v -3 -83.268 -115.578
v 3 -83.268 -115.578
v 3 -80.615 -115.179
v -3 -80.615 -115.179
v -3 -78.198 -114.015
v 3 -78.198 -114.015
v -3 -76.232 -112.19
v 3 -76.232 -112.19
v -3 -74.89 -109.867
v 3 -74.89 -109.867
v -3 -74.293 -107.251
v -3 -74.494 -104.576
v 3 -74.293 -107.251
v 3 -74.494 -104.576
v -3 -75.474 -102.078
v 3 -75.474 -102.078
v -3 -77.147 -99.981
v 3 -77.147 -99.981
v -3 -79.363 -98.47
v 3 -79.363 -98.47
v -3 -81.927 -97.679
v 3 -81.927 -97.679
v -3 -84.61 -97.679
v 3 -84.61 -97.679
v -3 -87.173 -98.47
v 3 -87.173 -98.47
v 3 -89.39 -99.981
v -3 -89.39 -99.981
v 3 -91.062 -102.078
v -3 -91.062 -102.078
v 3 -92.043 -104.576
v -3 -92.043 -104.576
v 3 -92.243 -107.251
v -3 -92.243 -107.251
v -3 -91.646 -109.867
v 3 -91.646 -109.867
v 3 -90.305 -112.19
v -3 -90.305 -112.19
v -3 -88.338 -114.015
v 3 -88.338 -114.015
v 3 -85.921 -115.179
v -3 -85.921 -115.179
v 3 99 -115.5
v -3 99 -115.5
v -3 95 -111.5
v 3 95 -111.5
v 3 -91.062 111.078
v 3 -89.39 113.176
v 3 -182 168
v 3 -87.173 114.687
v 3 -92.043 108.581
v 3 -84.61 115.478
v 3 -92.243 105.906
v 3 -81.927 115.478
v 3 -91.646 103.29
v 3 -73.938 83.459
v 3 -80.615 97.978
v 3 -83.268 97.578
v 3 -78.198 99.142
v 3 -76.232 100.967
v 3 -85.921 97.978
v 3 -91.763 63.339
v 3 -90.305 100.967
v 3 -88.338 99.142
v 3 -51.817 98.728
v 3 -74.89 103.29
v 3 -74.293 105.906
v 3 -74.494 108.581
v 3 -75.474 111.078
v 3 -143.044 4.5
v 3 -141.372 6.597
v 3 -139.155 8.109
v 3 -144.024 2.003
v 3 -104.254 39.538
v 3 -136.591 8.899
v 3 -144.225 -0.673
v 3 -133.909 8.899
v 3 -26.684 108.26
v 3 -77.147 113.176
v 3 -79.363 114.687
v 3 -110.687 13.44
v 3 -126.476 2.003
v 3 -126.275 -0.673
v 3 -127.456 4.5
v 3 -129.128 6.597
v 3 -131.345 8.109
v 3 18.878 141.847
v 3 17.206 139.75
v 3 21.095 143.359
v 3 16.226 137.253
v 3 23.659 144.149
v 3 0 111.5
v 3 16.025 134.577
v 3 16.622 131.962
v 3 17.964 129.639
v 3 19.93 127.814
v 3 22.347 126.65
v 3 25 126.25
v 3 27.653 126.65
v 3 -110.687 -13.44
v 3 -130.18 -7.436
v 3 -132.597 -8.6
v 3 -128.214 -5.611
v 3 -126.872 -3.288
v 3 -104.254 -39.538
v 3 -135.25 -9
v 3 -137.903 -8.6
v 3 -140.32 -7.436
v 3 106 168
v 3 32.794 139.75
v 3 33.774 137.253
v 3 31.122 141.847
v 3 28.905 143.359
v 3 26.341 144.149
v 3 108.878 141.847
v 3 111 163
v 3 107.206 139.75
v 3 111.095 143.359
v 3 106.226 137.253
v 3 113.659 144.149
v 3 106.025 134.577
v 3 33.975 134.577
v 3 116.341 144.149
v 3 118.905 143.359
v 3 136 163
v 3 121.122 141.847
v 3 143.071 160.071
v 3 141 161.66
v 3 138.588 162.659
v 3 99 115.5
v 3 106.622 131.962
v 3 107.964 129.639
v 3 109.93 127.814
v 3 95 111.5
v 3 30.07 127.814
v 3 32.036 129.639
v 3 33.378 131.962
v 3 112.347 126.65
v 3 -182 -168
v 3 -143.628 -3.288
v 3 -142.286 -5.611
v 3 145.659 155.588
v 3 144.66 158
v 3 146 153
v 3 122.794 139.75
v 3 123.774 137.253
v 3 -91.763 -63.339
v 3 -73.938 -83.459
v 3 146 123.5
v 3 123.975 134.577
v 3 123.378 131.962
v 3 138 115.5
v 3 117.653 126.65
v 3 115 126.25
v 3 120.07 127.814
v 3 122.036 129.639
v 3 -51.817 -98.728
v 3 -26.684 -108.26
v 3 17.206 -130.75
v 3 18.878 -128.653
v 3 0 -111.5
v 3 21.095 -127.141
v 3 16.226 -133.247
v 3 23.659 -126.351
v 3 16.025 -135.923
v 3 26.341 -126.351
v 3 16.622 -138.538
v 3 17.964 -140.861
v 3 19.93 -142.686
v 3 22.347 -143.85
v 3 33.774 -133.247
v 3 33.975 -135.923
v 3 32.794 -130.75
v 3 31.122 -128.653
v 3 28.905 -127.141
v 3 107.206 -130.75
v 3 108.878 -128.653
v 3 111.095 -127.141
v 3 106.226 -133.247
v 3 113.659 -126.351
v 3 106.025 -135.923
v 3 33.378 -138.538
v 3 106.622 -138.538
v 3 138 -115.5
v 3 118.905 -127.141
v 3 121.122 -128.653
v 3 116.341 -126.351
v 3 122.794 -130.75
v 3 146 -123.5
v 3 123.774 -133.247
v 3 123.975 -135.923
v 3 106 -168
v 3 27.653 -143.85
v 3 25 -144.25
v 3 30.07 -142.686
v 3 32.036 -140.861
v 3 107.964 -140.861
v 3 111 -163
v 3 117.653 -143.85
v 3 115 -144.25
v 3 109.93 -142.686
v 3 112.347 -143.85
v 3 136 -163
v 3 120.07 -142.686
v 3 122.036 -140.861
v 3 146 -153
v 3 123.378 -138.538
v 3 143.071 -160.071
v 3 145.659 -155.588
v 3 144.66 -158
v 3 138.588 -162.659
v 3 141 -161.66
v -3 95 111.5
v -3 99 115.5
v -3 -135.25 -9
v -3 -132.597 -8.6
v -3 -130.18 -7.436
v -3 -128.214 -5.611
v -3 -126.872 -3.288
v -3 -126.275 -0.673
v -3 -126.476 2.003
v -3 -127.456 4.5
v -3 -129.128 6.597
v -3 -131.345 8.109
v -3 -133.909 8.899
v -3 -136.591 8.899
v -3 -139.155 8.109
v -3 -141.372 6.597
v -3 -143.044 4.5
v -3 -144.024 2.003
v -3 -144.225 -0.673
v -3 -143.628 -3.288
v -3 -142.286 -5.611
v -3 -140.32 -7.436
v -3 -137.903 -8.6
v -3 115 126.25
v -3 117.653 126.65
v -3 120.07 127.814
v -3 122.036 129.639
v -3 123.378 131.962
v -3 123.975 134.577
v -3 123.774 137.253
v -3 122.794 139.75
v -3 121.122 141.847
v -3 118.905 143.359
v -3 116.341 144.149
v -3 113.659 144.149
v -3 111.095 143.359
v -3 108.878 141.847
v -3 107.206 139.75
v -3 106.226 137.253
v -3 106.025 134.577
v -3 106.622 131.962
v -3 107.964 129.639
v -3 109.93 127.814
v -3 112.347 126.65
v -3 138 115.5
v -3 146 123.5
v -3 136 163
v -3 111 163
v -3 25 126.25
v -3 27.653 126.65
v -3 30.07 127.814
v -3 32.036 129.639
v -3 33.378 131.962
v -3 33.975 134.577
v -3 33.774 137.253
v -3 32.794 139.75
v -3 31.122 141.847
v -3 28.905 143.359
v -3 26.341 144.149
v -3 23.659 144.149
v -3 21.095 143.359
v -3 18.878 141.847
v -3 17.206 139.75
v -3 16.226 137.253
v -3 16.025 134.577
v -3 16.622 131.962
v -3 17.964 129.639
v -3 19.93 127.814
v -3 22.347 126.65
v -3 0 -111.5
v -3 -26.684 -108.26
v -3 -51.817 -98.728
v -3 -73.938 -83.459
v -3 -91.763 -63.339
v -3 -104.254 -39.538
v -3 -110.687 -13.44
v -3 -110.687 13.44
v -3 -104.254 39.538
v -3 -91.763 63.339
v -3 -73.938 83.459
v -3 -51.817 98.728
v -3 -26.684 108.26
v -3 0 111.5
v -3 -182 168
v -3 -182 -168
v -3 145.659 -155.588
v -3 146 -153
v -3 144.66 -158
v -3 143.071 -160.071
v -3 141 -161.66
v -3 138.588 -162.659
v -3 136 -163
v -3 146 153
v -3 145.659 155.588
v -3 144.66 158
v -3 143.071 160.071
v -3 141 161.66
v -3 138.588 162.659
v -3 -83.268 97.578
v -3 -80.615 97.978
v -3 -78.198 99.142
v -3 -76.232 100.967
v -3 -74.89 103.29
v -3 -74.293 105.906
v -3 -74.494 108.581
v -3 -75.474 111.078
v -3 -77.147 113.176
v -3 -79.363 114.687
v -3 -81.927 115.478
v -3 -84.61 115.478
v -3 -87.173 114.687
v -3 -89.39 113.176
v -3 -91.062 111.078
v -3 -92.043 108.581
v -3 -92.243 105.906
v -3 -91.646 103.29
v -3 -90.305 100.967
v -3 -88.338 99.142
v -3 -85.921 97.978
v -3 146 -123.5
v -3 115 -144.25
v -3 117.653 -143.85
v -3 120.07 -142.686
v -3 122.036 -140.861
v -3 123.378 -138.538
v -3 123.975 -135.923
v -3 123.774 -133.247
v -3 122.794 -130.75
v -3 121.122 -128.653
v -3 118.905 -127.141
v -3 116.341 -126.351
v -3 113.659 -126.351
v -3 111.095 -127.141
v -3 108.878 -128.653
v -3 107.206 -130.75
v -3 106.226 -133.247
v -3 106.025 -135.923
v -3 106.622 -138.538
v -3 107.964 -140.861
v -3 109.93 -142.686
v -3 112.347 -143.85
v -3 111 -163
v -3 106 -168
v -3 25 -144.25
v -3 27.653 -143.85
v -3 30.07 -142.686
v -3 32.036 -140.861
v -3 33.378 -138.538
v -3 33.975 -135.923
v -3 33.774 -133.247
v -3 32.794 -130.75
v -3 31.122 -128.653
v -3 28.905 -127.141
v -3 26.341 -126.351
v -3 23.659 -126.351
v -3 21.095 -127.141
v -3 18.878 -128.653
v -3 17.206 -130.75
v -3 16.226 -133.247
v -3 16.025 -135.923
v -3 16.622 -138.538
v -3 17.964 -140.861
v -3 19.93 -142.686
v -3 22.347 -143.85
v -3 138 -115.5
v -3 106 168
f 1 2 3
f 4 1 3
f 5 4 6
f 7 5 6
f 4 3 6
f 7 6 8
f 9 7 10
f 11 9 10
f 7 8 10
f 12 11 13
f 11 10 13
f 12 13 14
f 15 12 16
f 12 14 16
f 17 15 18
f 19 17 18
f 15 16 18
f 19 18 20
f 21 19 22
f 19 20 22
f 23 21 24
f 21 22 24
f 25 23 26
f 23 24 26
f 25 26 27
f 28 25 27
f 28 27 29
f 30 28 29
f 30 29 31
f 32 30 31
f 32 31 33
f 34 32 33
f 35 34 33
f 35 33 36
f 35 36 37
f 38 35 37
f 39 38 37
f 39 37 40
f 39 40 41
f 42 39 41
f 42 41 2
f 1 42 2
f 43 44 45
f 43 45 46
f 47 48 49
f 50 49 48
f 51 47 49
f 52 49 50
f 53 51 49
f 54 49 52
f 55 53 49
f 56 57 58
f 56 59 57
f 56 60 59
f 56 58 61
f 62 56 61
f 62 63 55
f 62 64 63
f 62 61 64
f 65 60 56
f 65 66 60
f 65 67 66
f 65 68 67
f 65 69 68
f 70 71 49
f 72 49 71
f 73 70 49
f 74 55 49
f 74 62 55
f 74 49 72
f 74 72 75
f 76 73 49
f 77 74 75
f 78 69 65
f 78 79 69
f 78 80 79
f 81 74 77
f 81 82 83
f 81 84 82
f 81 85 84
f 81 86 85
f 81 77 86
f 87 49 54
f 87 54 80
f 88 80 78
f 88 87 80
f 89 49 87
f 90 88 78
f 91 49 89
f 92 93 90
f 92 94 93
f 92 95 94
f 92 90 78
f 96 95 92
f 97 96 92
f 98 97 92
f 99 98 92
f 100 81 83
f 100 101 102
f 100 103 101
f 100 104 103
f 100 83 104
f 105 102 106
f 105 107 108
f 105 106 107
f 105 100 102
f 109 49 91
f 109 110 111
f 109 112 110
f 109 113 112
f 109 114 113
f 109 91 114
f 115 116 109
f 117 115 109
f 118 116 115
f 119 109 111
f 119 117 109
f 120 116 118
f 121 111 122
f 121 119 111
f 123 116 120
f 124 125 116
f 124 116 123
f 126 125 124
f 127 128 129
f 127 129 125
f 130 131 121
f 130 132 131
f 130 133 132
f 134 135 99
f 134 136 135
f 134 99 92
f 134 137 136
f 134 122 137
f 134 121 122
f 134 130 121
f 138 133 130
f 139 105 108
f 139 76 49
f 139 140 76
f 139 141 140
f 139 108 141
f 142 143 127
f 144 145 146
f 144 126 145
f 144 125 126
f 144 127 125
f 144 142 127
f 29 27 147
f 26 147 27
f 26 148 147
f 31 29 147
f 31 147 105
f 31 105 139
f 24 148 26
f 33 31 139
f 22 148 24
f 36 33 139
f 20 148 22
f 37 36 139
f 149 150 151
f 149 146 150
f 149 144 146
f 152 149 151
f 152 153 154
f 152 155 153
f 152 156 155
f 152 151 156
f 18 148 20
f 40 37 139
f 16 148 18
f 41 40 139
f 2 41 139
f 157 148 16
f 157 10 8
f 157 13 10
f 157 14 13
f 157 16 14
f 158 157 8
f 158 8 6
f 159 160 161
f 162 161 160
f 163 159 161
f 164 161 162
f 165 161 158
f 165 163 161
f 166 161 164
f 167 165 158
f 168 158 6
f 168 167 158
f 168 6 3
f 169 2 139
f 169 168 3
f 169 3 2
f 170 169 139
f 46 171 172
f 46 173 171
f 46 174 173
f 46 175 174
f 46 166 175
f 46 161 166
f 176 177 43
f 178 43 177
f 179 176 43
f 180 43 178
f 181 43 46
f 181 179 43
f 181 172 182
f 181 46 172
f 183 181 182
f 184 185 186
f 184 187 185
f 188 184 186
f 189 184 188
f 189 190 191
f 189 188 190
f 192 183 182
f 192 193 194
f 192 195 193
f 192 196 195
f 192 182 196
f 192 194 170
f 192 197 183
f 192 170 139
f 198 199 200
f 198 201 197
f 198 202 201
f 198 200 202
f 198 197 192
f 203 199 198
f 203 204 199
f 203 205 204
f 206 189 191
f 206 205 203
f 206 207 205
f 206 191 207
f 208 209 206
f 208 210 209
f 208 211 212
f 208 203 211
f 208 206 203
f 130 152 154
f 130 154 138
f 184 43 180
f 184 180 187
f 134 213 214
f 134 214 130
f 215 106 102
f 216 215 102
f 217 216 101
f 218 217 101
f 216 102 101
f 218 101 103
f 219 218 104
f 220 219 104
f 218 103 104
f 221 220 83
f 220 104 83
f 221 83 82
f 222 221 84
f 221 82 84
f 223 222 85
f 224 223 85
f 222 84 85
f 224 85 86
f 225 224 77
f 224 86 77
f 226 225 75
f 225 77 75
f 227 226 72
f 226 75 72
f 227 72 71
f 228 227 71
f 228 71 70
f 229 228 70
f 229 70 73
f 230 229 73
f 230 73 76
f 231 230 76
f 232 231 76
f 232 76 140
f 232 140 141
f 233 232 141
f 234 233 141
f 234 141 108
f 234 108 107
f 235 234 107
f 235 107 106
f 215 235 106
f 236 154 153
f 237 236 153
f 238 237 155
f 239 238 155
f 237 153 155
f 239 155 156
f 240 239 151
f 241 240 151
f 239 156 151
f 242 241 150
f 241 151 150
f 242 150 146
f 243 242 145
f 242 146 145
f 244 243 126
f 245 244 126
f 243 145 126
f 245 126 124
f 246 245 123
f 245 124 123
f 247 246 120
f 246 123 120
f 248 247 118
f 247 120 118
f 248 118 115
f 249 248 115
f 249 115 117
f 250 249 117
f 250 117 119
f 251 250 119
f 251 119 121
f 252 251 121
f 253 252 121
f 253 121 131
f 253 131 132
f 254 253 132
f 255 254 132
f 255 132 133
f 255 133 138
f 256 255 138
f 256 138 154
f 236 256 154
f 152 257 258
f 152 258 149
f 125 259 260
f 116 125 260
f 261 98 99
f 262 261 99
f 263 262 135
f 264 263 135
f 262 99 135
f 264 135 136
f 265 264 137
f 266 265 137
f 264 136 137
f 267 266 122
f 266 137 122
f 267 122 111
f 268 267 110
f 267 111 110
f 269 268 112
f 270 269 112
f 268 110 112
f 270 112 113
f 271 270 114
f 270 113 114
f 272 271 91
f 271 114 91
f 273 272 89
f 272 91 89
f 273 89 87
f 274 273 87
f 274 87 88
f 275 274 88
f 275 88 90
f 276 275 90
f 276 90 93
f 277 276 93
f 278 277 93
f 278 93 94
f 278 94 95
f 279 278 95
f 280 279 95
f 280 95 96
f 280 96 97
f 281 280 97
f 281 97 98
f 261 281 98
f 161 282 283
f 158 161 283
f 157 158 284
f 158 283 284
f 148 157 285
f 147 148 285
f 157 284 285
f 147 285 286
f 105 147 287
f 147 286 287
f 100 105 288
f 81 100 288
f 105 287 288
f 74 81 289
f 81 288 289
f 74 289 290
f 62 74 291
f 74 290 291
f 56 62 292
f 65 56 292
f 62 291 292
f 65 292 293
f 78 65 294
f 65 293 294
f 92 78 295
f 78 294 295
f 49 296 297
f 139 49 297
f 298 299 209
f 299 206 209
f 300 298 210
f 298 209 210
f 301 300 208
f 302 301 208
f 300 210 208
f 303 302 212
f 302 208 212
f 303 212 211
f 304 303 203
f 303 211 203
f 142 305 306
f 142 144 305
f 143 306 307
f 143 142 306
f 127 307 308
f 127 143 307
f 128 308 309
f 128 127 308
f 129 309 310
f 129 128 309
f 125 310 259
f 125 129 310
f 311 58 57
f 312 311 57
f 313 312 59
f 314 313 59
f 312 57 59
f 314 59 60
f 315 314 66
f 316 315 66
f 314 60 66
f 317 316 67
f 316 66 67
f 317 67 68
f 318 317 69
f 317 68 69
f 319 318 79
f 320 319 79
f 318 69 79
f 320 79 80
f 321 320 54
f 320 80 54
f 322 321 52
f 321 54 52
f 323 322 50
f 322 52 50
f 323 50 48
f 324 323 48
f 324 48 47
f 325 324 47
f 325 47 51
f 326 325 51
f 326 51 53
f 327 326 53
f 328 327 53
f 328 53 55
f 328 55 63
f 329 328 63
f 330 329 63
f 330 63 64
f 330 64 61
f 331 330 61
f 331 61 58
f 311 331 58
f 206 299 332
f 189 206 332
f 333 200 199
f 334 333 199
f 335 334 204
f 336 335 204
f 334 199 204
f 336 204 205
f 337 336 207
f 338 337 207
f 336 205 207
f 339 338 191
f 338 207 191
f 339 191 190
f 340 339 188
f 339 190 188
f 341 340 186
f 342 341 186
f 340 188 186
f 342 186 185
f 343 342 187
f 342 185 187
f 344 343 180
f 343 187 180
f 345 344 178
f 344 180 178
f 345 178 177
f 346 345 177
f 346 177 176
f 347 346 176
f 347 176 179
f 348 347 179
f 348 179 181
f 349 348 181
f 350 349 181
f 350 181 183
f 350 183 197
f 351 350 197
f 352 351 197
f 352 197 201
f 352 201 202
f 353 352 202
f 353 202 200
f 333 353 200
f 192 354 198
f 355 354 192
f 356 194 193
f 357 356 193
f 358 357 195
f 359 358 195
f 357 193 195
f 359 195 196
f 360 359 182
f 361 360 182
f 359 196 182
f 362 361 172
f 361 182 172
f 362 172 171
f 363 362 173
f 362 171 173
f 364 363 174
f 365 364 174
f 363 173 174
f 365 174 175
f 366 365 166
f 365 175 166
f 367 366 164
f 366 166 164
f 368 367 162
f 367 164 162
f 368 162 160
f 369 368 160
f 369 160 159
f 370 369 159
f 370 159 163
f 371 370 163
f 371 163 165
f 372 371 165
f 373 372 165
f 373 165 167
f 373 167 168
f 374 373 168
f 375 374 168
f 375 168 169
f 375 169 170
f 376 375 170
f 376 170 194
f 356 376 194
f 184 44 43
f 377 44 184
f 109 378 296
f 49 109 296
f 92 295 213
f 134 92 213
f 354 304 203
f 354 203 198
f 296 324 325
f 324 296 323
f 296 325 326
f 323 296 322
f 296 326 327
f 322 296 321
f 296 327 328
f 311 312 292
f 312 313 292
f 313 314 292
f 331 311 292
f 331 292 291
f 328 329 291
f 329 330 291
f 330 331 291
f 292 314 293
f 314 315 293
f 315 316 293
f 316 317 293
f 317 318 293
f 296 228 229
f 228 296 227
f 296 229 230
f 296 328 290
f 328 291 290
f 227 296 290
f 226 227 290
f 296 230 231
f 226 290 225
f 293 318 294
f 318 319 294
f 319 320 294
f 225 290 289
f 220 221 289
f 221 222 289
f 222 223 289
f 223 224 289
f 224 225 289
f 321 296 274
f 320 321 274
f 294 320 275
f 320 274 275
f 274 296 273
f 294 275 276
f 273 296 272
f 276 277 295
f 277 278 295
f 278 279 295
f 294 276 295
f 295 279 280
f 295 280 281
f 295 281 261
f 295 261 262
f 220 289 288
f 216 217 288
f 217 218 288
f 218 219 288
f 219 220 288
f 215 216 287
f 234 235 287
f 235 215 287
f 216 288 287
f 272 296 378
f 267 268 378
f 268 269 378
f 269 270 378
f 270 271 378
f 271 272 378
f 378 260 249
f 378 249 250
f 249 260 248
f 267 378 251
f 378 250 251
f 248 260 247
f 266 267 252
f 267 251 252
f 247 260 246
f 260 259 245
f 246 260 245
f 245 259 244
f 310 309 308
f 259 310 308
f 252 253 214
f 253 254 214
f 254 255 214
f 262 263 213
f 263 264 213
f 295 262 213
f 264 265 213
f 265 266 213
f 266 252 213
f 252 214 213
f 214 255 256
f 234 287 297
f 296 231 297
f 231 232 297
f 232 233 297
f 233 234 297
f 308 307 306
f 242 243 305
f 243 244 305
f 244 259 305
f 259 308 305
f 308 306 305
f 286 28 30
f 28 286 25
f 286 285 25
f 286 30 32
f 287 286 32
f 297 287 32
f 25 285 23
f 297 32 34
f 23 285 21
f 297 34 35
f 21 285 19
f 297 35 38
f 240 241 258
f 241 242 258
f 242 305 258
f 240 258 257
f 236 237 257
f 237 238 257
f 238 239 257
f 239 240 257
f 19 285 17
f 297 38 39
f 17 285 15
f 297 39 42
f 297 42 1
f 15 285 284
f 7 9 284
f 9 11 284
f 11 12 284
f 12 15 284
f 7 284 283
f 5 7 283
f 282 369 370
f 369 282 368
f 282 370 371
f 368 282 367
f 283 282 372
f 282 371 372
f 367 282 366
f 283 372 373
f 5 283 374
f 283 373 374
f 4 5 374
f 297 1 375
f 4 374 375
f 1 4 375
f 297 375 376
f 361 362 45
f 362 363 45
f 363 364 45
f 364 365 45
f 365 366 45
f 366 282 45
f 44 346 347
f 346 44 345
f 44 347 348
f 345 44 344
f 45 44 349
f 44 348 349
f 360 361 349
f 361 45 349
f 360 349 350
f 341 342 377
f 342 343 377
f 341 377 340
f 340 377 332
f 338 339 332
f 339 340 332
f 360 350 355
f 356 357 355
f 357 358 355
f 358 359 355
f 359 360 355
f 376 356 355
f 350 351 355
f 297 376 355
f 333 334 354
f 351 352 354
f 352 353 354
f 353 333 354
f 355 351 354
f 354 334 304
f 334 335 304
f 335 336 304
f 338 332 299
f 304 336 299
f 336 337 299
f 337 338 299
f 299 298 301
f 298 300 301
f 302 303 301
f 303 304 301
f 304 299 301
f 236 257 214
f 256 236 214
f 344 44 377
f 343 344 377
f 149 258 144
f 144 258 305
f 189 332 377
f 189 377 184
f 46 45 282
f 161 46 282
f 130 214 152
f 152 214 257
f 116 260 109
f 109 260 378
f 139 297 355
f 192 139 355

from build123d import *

# Parameters (mm, degrees)
SM_START                 = -3
SM_BASE_FLANGE_1_DEPTH   = 6
SKETCH_6_R               = 9
SKETCH_6_R_2             = 68.5
CUT_EXTRUDE_1_DEPTH      = 248.757946391
CUT_EXTRUDE_2_DEPTH      = 248.703451732
CUT_EXTRUDE_2_DEPTH_BACK = 248.703451732
FILLET_1_R               = 10
CUT_EXTRUDE_3_DEPTH      = 248.703451732
CUT_EXTRUDE_3_DEPTH_BACK = 248.703451732
SKETCH_9_W               = 4
SKETCH_9_H               = 47
CHAMFER_1_SIZE           = 8
CHAMFER_2_SIZE           = 4


# Read off the part's stored shape, not the designer's step: Базовая кромка1
with BuildPart() as part:
    # Базовая кромка1 outline → Базовая кромка1 (new body)
    with BuildSketch(Plane(origin=(0, 0, 0), x_dir=(0, 0, -1), z_dir=(1, 0, 0)).offset(SM_START)):
        with BuildLine():
            Line((-111.5, 0), (-111.5, 146))
            Line((-111.5, 146), (-168, 146))
            Line((-168, 146), (-168, -182))
            Line((-168, -182), (168, -182))
            Line((168, -182), (168, 146))
            Line((168, 146), (111.5, 146))
            Line((111.5, 146), (111.5, 0))
            ThreePointArc((111.5, 0), (0, -111.5), (-111.5, 0))
        make_face()
    extrude(amount=SM_BASE_FLANGE_1_DEPTH)

    # Эскиз6 → Вырез-Вытянуть1 (cut, through all)
    with BuildSketch(Plane(origin=(3, 0, 0), x_dir=(0, 0, -1), z_dir=(1, 0, 0))):
        with Locations((-135.25, 115)):
            Circle(SKETCH_6_R)
        with Locations((-106.578454425, -83.268214538)):
            Circle(SKETCH_6_R)
        with Locations((0, -135.25)):
            Circle(SKETCH_6_R)
        with Locations((106.578454425, -83.268214538)):
            Circle(SKETCH_6_R)
        with Locations((135.25, 115)):
            Circle(SKETCH_6_R)
        Circle(SKETCH_6_R_2)
        with Locations((-135.25, 25)):
            Circle(SKETCH_6_R)
        with Locations((135.25, 25)):
            Circle(SKETCH_6_R)
    extrude(amount=-CUT_EXTRUDE_1_DEPTH, mode=Mode.SUBTRACT)

    # Эскиз8 → Вырез-Вытянуть2 (cut, two sides: drawn at the far end of the back side and taken through both)
    with BuildSketch(Plane(origin=(0, 0, 0), x_dir=(0, 0, -1), z_dir=(1, 0, 0)).offset(-CUT_EXTRUDE_2_DEPTH_BACK)):
        Polygon((-163, 111), (-168, 106), (-168, 111), (-168, 146), (-163, 146), align=None)
        Polygon((168, 146), (163, 146), (163, 111), (168, 106), (168, 111), align=None)
    extrude(amount=CUT_EXTRUDE_2_DEPTH + CUT_EXTRUDE_2_DEPTH_BACK, mode=Mode.SUBTRACT)

    # Скругление1
    fillet_1_edges = [part.edges().sort_by_distance(p)[0] for p in [
        (0, 146, 163),
        (0, 146, -163),
    ]]
    fillet(fillet_1_edges, radius=FILLET_1_R)

    # Эскиз9 → Вырез-Вытянуть3 (cut, two sides: drawn at the far end of the back side and taken through both)
    with BuildSketch(Plane(origin=(0, 0, 0), x_dir=(0, 0, -1), z_dir=(1, 0, 0)).offset(-CUT_EXTRUDE_3_DEPTH_BACK)):
        with Locations((-113.5, 122.5)):
            Rectangle(SKETCH_9_W, SKETCH_9_H)
        with Locations((113.5, 122.5)):
            Rectangle(SKETCH_9_W, SKETCH_9_H)
    extrude(amount=CUT_EXTRUDE_3_DEPTH + CUT_EXTRUDE_3_DEPTH_BACK, mode=Mode.SUBTRACT)

    # Фаска1
    chamfer_1_edges = [part.edges().sort_by_distance(p)[0] for p in [
        (0, 146, 115.5),
        (0, 146, -115.5),
    ]]
    chamfer(chamfer_1_edges, length=CHAMFER_1_SIZE)

    # Фаска2
    chamfer_2_edges = [part.edges().sort_by_distance(p)[0] for p in [
        (0, 99, -111.5),
        (0, 99, 111.5),
    ]]
    chamfer(chamfer_2_edges, length=CHAMFER_2_SIZE - 0.0001)  # a hair under: the kernel refuses the full size


solid = part.part
